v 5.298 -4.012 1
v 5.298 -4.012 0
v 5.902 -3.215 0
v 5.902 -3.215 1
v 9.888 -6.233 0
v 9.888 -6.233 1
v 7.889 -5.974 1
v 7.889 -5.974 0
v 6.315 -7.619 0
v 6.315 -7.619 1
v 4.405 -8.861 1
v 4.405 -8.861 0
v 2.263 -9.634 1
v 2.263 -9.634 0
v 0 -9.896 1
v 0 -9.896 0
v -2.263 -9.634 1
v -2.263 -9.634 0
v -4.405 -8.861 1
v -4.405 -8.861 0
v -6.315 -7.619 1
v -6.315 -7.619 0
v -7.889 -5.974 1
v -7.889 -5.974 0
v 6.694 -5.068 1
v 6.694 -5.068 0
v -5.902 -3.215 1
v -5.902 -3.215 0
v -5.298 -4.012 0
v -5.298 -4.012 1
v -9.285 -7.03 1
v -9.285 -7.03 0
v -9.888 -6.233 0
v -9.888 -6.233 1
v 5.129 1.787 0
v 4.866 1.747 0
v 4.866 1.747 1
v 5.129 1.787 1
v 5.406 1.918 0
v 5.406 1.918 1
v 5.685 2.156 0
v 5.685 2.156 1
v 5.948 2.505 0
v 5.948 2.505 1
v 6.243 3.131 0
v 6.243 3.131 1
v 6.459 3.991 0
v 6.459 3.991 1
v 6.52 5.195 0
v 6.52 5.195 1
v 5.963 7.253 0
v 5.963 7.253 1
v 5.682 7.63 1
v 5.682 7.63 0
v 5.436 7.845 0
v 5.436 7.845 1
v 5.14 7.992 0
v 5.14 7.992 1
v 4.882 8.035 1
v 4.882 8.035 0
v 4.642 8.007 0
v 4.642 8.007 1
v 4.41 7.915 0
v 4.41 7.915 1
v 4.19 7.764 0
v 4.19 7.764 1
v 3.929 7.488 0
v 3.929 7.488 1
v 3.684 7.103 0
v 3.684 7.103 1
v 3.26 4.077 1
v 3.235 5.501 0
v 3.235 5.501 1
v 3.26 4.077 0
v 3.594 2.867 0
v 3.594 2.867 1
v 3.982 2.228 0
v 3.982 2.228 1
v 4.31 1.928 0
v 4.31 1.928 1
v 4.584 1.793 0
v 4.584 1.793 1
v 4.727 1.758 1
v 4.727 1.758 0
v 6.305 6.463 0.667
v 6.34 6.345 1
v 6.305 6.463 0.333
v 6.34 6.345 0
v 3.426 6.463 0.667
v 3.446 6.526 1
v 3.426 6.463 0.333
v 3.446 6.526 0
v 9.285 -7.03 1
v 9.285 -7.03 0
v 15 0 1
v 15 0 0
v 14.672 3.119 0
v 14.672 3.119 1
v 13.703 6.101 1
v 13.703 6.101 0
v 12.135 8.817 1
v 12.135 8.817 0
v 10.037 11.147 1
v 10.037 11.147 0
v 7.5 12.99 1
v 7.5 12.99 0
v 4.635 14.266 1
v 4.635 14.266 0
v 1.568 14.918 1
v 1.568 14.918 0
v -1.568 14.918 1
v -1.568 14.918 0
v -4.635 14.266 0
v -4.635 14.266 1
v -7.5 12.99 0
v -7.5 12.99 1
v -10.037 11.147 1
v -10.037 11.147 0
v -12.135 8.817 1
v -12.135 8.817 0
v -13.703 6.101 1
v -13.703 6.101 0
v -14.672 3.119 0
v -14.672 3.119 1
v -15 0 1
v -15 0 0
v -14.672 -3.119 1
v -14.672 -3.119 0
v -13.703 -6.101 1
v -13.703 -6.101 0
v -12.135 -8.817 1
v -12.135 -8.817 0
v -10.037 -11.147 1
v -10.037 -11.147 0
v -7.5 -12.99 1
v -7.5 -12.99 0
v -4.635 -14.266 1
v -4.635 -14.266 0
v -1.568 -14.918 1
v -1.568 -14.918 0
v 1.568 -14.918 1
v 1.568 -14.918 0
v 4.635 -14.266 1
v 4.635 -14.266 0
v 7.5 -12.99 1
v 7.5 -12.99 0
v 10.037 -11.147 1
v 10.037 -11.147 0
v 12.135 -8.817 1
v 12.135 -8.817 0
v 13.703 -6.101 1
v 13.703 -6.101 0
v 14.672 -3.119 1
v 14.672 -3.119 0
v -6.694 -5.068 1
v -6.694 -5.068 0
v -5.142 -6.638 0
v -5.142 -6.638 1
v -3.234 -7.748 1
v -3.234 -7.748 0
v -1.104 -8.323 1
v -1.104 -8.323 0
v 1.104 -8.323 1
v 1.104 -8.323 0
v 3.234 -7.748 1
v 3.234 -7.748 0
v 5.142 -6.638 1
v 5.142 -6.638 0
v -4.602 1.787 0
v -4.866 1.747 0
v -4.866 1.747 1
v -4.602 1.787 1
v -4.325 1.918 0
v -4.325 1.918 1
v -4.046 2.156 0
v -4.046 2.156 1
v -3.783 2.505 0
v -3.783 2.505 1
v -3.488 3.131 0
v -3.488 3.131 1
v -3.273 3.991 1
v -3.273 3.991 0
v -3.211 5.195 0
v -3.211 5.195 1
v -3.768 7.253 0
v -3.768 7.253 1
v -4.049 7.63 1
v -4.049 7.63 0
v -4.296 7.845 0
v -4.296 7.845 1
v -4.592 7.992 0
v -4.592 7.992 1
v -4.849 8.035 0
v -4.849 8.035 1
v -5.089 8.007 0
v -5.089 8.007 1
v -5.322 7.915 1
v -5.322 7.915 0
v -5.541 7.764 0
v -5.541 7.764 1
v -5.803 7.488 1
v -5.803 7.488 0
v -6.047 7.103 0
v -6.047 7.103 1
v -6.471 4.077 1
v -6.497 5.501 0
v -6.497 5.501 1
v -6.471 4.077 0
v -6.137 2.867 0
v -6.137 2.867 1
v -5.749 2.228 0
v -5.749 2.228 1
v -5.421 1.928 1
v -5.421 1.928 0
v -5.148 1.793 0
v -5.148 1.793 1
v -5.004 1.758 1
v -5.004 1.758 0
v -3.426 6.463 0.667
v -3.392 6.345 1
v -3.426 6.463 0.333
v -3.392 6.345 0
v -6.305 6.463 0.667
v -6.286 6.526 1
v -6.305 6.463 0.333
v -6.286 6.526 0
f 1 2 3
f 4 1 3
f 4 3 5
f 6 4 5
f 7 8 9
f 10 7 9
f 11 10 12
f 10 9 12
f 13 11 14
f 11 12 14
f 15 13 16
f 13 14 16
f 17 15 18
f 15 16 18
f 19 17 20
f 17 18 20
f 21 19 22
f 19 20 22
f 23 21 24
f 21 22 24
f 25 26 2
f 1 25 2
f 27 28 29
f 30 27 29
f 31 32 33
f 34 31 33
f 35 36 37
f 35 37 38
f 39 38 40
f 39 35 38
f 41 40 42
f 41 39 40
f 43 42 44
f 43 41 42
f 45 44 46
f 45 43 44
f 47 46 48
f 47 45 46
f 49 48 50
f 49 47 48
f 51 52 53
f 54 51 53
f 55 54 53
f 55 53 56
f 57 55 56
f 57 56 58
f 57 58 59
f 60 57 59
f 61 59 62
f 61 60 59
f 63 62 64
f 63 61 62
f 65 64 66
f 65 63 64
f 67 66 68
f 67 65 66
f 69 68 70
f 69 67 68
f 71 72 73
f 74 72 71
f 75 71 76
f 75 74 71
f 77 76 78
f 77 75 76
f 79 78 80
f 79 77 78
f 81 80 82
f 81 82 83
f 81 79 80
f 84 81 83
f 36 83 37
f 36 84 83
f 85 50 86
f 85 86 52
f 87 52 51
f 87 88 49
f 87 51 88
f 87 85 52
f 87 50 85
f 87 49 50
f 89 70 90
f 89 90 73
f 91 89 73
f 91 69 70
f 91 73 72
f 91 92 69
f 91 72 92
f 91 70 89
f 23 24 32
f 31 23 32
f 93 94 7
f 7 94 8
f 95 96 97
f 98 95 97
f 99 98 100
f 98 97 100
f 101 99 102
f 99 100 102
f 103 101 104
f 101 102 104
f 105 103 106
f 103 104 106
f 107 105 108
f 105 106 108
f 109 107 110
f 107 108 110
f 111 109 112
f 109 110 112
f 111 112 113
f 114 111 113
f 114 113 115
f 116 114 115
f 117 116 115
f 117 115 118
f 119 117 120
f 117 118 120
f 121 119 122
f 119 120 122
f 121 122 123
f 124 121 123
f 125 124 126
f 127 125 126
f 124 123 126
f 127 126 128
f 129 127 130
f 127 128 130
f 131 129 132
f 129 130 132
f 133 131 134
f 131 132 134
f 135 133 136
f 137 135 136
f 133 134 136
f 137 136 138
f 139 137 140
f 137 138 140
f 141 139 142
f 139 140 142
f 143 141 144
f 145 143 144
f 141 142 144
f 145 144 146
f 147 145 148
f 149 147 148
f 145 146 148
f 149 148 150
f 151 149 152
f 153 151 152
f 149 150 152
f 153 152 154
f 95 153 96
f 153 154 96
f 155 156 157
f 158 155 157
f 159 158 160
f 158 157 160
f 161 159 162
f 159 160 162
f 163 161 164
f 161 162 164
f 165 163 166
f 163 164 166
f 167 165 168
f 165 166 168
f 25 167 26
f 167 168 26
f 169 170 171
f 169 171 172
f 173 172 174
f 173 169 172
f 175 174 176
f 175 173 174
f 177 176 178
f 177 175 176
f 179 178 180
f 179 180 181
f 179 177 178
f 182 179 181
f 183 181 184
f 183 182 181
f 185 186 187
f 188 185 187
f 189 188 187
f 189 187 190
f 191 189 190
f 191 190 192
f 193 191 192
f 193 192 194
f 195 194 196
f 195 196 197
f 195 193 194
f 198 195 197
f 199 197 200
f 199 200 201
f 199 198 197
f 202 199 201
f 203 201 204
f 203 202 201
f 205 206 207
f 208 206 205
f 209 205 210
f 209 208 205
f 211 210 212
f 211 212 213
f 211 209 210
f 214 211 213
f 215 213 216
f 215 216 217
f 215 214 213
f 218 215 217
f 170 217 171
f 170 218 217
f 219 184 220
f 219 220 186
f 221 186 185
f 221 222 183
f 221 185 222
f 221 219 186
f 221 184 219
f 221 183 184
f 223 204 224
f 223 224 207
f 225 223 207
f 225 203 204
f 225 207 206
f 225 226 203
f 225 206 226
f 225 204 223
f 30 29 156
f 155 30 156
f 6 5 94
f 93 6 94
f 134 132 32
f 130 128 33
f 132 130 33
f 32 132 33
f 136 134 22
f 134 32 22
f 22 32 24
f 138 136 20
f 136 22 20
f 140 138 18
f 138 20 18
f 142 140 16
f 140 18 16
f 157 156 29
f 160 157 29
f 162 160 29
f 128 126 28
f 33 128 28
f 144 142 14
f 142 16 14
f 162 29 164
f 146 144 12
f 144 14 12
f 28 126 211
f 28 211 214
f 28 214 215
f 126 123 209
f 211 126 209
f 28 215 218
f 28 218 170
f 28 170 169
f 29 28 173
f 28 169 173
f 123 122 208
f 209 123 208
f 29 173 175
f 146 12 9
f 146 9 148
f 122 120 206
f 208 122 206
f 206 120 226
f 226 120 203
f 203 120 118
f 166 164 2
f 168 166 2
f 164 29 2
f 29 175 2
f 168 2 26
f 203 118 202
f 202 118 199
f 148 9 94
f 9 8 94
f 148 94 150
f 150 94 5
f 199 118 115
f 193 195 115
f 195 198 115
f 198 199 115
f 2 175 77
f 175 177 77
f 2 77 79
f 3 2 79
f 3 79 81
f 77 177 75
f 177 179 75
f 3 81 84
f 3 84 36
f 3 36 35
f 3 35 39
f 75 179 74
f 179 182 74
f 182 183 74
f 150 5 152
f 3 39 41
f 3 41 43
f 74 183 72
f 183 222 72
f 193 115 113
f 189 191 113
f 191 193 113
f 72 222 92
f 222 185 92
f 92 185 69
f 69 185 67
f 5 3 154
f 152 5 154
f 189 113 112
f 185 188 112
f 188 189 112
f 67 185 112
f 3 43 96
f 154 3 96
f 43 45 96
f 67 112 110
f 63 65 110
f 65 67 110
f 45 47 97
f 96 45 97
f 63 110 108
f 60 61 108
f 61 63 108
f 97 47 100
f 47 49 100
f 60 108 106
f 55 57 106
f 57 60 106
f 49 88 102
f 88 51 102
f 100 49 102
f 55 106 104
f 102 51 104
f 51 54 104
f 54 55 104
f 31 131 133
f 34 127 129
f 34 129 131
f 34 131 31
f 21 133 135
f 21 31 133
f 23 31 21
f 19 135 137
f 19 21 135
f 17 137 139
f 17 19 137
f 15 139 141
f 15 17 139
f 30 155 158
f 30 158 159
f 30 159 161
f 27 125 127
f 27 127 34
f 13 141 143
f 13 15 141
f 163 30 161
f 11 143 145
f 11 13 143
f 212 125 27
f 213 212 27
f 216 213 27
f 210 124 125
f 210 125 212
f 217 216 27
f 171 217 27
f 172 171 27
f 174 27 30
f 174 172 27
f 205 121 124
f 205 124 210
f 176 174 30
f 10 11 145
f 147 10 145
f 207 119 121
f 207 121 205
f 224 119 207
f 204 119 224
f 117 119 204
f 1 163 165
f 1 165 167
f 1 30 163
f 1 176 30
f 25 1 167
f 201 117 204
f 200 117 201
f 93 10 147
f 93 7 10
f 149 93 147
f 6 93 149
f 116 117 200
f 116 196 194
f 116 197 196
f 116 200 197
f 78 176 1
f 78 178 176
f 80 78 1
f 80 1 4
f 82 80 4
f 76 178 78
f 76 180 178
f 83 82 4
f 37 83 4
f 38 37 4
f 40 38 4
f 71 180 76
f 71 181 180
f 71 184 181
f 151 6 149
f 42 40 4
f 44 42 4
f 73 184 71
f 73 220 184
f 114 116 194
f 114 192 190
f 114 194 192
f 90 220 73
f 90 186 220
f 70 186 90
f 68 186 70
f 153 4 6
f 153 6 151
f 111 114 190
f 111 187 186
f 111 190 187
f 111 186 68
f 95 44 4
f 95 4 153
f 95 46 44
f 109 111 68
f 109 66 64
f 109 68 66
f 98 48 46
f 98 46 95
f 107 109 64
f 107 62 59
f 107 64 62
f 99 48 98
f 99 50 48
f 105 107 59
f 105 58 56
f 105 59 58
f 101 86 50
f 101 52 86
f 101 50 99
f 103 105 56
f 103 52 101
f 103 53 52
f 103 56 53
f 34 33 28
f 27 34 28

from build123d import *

# Parameters (mm, degrees)
F0_R     = 15
F1_DEPTH = 1


with BuildPart() as f1:
    # F0 (on Top) → F1 (new body)
    with BuildSketch(Plane.XY):
        Circle(F0_R)
        with BuildLine():
            Line((-5.298381, -4.011998), (-6.693536, -5.068426))
            ThreePointArc((-6.693536, -5.068426), (0, -8.395973), (6.693536, -5.068426))
            Line((6.693536, -5.068426), (5.298381, -4.011998))
            Line((5.298381, -4.011998), (5.902054, -3.214766))
            Line((5.902054, -3.214766), (9.888212, -6.233134))
            Line((9.888212, -6.233134), (9.284539, -7.030365))
            Line((9.284539, -7.030365), (7.889383, -5.973937))
            ThreePointArc((7.889383, -5.973937), (0, -9.895973), (-7.889383, -5.973937))
            Line((-7.889383, -5.973937), (-9.284539, -7.030365))
            Line((-9.284539, -7.030365), (-9.888212, -6.233134))
            Line((-9.888212, -6.233134), (-5.902054, -3.214766))
            Line((-5.902054, -3.214766), (-5.298381, -4.011998))
        make_face(mode=Mode.SUBTRACT)
        with BuildLine():
            add(Edge.make_bspline(
                [(-4.86562, 1.747414), (-1.986049, 1.747414), (-3.425834, 6.463213), (-4.86562, 11.179012), (-6.305405, 6.463213), (-7.745191, 1.747414), (-4.86562, 1.747414)],
                knots=[0, 0, 0, 2.094395, 2.094395, 4.18879, 4.18879, 6.283185, 6.283185, 6.283185], degree=2, weights=[1, 0.5, 1, 0.5, 1, 0.5, 1]))
        make_face(mode=Mode.SUBTRACT)
        with BuildLine():
            add(Edge.make_bspline(
                [(4.86562, 1.747414), (7.745191, 1.747414), (6.305405, 6.463213), (4.86562, 11.179012), (3.425834, 6.463213), (1.986049, 1.747414), (4.86562, 1.747414)],
                knots=[0, 0, 0, 2.094395, 2.094395, 4.18879, 4.18879, 6.283185, 6.283185, 6.283185], degree=2, weights=[1, 0.5, 1, 0.5, 1, 0.5, 1]))
        make_face(mode=Mode.SUBTRACT)
    extrude(amount=F1_DEPTH)


solid = f1.part
